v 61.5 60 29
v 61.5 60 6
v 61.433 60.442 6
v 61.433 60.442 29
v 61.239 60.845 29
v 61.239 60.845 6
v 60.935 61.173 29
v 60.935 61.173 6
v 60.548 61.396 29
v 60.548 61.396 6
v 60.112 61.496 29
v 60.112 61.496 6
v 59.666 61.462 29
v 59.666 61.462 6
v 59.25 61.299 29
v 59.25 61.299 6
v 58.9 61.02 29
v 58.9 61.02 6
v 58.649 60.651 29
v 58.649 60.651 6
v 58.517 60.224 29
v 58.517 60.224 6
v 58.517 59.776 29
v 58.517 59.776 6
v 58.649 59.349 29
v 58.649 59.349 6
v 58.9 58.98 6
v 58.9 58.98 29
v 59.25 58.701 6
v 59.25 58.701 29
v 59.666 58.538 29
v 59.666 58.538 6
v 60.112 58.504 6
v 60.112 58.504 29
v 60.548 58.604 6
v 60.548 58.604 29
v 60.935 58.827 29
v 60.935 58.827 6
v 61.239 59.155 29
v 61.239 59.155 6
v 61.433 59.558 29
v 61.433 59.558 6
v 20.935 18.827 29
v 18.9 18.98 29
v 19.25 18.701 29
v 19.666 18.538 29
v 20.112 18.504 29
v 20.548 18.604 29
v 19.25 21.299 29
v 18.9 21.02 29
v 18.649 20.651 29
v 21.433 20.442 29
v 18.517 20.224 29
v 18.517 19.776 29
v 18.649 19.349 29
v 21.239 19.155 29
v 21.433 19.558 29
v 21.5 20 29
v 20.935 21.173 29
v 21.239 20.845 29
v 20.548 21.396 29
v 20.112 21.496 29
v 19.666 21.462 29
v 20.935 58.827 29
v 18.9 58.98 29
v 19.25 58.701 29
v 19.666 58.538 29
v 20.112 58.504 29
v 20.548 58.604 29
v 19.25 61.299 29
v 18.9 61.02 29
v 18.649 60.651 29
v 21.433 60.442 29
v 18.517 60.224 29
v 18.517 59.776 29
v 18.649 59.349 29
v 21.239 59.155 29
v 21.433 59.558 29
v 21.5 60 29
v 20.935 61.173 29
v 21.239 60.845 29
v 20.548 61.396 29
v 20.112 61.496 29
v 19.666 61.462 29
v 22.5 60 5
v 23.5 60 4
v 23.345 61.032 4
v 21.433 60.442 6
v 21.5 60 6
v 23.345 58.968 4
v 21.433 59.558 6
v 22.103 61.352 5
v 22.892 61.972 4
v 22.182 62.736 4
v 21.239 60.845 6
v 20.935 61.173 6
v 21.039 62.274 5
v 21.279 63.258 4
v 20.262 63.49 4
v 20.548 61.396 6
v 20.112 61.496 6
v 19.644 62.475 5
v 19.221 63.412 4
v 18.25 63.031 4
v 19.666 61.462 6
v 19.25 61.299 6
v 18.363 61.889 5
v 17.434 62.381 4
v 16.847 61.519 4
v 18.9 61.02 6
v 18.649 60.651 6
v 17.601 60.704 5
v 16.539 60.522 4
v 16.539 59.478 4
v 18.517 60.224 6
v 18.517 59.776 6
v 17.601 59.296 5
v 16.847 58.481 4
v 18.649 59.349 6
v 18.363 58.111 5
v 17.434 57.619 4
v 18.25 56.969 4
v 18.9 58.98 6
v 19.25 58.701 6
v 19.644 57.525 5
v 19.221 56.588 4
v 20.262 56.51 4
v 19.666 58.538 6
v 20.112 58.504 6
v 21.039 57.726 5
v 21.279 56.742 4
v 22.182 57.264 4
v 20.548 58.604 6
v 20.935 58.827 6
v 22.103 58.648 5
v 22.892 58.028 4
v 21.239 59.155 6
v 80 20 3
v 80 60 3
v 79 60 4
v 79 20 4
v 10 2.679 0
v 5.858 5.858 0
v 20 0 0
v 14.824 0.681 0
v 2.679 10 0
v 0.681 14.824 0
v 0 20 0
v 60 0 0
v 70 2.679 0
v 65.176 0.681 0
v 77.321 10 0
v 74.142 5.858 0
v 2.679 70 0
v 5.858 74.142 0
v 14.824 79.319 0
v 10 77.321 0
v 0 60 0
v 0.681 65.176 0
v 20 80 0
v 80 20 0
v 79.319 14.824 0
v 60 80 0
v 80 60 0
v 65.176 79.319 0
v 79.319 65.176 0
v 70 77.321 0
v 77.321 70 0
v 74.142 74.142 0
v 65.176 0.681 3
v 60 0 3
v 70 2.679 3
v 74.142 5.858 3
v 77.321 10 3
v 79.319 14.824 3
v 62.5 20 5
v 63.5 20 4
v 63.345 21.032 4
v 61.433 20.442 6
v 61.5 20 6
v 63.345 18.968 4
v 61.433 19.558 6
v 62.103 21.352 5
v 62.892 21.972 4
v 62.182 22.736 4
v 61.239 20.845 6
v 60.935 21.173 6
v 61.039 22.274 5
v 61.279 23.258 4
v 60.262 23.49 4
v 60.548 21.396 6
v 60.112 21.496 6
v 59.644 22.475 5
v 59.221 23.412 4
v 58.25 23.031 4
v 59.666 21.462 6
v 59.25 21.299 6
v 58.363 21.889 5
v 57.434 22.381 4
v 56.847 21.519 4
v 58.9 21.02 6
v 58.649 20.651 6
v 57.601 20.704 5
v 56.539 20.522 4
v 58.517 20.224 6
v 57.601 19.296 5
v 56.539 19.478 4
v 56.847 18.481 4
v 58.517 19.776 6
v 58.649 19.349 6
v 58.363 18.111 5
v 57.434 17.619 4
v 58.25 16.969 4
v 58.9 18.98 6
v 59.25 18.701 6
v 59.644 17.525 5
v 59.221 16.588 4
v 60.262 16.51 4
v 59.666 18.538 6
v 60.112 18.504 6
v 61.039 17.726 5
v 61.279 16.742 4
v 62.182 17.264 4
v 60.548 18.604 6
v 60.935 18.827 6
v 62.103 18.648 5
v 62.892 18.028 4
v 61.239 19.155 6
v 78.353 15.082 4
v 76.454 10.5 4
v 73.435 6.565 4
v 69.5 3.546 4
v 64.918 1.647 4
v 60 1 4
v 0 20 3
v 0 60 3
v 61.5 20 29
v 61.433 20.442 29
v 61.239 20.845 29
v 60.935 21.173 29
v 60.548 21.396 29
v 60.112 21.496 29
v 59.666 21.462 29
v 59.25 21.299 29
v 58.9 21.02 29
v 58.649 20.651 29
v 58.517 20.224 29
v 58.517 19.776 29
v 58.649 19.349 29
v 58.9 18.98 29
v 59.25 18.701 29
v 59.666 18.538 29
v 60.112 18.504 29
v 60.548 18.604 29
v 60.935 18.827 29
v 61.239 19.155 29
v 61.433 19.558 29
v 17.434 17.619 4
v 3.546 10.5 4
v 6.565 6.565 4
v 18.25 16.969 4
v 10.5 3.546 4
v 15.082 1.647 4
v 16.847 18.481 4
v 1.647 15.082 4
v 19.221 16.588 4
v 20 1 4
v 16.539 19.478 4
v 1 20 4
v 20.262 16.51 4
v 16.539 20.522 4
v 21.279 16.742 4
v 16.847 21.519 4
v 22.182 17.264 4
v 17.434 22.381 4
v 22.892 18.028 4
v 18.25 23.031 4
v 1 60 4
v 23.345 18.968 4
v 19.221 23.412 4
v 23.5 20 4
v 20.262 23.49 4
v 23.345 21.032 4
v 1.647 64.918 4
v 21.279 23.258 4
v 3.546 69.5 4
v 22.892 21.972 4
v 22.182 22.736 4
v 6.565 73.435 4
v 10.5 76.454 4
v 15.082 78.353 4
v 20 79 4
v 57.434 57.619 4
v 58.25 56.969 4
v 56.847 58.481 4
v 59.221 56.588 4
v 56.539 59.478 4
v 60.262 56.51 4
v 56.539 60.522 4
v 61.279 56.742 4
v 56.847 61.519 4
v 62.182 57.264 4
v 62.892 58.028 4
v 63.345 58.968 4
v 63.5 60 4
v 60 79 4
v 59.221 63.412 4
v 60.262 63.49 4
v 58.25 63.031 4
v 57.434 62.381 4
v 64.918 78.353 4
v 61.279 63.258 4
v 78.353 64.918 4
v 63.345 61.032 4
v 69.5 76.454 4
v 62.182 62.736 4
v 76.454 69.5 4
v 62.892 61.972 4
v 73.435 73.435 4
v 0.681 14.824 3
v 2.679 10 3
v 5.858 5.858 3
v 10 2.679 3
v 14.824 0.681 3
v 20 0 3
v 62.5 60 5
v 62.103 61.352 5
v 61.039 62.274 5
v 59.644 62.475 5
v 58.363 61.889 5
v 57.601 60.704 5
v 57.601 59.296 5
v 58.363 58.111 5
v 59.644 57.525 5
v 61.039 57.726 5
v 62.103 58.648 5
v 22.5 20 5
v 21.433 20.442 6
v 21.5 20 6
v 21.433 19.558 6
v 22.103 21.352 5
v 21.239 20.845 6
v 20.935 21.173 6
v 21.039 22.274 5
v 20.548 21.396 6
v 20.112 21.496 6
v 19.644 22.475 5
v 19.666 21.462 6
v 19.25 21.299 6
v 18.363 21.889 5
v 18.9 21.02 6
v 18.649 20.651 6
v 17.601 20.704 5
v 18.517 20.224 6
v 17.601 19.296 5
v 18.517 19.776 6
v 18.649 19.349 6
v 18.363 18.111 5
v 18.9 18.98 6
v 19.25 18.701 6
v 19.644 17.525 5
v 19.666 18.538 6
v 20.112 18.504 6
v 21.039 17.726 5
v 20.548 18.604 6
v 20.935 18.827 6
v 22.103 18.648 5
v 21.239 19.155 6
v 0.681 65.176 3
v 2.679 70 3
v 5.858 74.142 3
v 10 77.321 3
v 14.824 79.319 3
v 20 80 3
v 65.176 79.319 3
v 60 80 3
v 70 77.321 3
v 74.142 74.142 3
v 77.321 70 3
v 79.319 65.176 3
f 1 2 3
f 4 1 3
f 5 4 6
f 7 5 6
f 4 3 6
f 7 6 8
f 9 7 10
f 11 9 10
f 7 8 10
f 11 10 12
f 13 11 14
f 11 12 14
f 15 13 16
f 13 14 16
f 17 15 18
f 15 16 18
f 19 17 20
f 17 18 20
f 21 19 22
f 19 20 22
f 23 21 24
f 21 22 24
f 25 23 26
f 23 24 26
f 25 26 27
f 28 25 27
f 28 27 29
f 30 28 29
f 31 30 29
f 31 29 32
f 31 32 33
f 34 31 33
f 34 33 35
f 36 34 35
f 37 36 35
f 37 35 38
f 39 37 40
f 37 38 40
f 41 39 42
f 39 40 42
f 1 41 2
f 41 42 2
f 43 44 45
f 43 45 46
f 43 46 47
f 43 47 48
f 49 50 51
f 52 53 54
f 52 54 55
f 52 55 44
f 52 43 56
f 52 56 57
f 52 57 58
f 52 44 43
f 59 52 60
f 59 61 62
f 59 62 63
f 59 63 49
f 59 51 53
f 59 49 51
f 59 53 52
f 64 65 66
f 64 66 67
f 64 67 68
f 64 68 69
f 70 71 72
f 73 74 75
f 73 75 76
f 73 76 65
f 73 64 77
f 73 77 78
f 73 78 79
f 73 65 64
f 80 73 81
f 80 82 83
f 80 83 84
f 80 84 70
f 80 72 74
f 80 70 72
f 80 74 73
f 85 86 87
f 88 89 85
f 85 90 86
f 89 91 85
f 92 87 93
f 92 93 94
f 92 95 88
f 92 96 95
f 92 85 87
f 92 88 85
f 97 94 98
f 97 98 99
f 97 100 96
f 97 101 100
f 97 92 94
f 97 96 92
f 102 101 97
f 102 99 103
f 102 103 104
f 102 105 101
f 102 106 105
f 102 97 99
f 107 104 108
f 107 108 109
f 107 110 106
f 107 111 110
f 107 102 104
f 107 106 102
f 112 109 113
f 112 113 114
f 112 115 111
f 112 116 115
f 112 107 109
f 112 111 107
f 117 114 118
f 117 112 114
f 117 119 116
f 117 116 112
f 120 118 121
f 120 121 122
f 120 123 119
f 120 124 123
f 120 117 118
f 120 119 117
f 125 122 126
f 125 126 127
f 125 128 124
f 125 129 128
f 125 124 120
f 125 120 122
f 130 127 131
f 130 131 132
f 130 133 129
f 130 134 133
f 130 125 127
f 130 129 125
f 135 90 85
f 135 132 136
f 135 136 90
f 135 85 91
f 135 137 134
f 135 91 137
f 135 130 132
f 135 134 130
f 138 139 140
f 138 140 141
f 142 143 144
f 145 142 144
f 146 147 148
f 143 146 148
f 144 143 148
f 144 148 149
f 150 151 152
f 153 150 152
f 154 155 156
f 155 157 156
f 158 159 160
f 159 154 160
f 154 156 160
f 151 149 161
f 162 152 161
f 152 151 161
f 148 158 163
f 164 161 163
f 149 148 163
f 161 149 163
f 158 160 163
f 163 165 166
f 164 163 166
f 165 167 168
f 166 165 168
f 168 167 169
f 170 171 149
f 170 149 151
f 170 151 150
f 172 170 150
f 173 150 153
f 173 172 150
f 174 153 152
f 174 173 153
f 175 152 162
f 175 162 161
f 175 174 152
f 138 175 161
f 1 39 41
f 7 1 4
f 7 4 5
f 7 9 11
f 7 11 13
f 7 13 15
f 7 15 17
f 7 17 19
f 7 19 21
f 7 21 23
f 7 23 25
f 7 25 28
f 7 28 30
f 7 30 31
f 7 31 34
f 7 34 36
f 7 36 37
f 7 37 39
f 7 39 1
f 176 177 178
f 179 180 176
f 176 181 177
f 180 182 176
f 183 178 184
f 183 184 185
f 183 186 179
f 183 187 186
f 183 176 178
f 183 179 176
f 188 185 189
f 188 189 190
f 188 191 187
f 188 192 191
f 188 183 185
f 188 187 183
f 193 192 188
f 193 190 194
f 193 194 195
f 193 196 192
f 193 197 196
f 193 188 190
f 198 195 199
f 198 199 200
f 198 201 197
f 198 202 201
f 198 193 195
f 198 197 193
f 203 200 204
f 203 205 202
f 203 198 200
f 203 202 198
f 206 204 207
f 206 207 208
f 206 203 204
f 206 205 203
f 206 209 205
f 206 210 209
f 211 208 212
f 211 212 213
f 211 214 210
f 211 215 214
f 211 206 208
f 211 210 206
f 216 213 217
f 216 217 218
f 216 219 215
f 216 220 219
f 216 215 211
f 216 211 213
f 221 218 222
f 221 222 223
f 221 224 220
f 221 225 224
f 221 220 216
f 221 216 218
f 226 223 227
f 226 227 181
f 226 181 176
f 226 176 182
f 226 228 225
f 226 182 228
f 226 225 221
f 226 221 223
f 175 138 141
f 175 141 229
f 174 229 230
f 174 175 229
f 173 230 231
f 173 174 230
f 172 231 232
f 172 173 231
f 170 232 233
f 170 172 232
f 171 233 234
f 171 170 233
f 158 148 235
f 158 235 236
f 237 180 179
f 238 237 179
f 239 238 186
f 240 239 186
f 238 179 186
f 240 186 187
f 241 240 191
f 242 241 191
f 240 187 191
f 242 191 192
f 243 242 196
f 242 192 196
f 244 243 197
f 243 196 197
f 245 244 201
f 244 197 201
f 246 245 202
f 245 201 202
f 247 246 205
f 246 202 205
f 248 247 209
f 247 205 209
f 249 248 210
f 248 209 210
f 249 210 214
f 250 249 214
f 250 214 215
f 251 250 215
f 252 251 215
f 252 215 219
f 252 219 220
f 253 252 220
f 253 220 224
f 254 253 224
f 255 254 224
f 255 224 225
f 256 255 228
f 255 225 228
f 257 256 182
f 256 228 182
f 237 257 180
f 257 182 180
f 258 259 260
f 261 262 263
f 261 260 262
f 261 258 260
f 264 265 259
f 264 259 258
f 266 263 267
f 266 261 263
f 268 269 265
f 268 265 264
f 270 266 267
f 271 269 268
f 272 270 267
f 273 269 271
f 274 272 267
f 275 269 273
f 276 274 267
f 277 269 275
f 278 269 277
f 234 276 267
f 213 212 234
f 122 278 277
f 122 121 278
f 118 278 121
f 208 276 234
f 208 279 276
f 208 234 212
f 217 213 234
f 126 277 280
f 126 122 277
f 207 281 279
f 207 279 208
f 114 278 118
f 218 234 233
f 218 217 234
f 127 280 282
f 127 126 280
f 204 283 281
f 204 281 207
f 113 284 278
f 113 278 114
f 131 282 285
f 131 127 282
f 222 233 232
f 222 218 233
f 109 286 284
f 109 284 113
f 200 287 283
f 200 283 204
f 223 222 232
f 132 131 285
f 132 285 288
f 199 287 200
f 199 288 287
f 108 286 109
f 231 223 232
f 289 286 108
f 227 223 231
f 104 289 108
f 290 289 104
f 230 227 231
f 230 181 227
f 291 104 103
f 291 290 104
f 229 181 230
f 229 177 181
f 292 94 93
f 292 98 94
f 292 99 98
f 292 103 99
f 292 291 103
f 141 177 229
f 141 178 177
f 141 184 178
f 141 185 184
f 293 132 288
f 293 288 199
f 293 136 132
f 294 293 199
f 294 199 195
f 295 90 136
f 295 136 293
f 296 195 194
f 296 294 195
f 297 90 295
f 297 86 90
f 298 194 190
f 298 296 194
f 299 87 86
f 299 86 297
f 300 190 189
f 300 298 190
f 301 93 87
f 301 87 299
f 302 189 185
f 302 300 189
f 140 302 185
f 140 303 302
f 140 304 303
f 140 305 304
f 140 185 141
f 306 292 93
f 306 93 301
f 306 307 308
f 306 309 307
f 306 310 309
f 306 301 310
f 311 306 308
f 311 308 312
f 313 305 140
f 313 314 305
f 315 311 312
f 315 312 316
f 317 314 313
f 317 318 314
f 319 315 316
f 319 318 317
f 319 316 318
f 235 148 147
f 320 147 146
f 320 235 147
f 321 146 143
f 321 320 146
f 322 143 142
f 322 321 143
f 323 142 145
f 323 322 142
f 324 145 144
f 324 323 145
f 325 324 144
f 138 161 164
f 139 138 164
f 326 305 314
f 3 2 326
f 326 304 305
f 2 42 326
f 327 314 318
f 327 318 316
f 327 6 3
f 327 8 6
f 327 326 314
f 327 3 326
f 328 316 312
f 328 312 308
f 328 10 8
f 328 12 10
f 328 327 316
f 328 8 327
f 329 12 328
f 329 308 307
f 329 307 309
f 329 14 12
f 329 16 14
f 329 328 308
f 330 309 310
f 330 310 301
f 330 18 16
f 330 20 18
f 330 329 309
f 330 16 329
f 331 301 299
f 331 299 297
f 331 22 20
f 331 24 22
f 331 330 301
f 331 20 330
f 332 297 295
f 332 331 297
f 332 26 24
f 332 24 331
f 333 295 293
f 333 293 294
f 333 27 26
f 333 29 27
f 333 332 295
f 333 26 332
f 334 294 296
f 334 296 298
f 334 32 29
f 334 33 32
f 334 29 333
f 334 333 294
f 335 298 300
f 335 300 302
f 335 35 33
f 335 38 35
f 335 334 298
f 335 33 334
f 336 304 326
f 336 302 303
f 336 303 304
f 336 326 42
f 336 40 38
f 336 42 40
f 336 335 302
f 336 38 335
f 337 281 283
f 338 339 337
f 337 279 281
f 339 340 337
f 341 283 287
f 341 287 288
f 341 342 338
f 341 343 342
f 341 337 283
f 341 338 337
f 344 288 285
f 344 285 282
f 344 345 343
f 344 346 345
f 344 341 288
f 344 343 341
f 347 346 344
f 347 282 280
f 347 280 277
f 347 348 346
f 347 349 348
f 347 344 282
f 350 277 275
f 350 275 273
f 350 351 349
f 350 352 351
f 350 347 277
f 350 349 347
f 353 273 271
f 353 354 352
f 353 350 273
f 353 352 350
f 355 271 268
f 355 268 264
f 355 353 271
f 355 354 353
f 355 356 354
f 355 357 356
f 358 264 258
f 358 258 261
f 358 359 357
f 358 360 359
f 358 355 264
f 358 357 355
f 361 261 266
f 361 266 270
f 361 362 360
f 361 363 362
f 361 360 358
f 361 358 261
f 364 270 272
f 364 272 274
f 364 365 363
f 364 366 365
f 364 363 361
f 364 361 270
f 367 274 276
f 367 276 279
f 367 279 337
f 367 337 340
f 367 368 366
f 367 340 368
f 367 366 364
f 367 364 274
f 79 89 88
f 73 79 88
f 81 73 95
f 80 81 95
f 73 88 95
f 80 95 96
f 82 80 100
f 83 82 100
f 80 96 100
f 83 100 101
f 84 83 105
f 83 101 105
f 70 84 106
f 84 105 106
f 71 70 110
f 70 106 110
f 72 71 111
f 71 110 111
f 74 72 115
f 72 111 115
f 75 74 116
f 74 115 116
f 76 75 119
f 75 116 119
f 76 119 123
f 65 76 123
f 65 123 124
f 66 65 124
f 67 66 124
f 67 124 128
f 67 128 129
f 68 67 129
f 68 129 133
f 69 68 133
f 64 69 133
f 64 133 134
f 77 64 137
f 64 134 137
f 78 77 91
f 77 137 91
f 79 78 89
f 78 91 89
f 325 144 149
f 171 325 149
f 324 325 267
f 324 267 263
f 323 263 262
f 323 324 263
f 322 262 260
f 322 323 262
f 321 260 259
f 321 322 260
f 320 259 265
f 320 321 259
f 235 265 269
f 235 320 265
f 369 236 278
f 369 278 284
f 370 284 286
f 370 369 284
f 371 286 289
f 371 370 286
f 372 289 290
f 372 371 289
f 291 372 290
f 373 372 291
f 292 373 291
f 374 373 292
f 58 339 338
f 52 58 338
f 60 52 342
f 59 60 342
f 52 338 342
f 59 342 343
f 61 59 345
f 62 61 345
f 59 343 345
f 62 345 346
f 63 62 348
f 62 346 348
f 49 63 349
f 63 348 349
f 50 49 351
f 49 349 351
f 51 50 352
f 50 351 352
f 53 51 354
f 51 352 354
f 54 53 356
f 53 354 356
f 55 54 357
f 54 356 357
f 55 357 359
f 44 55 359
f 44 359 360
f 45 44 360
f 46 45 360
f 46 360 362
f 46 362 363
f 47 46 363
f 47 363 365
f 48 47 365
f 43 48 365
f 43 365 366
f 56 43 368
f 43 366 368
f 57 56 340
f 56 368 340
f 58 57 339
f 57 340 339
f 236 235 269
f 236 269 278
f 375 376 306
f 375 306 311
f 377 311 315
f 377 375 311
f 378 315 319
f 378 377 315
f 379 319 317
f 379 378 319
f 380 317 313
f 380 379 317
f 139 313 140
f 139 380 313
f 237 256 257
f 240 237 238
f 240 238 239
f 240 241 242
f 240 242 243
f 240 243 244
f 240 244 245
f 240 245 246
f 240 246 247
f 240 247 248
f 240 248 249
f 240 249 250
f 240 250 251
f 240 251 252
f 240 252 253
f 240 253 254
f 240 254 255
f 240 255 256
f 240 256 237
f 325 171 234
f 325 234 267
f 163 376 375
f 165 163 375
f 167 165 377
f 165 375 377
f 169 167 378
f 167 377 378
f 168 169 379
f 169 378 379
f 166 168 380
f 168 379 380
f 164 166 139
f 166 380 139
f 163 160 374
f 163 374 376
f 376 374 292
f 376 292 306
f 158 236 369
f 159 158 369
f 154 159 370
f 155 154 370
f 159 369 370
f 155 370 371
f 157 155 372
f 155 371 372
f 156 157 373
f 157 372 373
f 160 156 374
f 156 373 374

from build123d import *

# Parameters (mm, degrees)
SKETCH_W        = 80
SKETCH_H        = 80
PAD_DEPTH       = 4
SKETCH001_R     = 1.5
PAD001_DEPTH    = 25
FILLET_R        = 20
CHAMFER_SIZE    = 2
CHAMFER001_SIZE = 1


with BuildPart() as part:
    # Sketch → Pad (new body)
    with BuildSketch(Plane.XY):
        with Locations((40, 40)):
            Rectangle(SKETCH_W, SKETCH_H)
    extrude(amount=PAD_DEPTH)

    # Sketch001 (on Face6 of Pad) → Pad001 (join)
    with BuildSketch(Plane.XY.offset(4)):
        with Locations((20, 60)):
            Circle(SKETCH001_R)
        with Locations((60, 60)):
            Circle(SKETCH001_R)
        with Locations((20, 20)):
            Circle(SKETCH001_R)
        with Locations((60, 20)):
            Circle(SKETCH001_R)
    extrude(amount=PAD001_DEPTH)

    # Fillet
    fillet_edges = [part.edges().sort_by_distance(p)[0] for p in [
        (80, 0, 2),
        (80, 80, 2),
        (0, 0, 2),
        (0, 80, 2),
    ]]
    fillet(fillet_edges, radius=FILLET_R)

    # Chamfer
    chamfer_edges = [part.edges().sort_by_distance(p)[0] for p in [
        (18.5, 60, 4),
        (18.5, 20, 4),
        (58.5, 20, 4),
        (58.5, 60, 4),
    ]]
    chamfer(chamfer_edges, length=CHAMFER_SIZE)

    # Chamfer001
    chamfer001_edges = [part.edges().sort_by_distance(p)[0] for p in [
        (0, 40, 4),
        (5.857864, 5.857864, 4),
        (40, 0, 4),
        (74.142136, 5.857864, 4),
        (80, 40, 4),
        (74.142136, 74.142136, 4),
        (40, 80, 4),
        (5.857864, 74.142136, 4),
    ]]
    chamfer(chamfer001_edges, length=CHAMFER001_SIZE)


solid = part.part
